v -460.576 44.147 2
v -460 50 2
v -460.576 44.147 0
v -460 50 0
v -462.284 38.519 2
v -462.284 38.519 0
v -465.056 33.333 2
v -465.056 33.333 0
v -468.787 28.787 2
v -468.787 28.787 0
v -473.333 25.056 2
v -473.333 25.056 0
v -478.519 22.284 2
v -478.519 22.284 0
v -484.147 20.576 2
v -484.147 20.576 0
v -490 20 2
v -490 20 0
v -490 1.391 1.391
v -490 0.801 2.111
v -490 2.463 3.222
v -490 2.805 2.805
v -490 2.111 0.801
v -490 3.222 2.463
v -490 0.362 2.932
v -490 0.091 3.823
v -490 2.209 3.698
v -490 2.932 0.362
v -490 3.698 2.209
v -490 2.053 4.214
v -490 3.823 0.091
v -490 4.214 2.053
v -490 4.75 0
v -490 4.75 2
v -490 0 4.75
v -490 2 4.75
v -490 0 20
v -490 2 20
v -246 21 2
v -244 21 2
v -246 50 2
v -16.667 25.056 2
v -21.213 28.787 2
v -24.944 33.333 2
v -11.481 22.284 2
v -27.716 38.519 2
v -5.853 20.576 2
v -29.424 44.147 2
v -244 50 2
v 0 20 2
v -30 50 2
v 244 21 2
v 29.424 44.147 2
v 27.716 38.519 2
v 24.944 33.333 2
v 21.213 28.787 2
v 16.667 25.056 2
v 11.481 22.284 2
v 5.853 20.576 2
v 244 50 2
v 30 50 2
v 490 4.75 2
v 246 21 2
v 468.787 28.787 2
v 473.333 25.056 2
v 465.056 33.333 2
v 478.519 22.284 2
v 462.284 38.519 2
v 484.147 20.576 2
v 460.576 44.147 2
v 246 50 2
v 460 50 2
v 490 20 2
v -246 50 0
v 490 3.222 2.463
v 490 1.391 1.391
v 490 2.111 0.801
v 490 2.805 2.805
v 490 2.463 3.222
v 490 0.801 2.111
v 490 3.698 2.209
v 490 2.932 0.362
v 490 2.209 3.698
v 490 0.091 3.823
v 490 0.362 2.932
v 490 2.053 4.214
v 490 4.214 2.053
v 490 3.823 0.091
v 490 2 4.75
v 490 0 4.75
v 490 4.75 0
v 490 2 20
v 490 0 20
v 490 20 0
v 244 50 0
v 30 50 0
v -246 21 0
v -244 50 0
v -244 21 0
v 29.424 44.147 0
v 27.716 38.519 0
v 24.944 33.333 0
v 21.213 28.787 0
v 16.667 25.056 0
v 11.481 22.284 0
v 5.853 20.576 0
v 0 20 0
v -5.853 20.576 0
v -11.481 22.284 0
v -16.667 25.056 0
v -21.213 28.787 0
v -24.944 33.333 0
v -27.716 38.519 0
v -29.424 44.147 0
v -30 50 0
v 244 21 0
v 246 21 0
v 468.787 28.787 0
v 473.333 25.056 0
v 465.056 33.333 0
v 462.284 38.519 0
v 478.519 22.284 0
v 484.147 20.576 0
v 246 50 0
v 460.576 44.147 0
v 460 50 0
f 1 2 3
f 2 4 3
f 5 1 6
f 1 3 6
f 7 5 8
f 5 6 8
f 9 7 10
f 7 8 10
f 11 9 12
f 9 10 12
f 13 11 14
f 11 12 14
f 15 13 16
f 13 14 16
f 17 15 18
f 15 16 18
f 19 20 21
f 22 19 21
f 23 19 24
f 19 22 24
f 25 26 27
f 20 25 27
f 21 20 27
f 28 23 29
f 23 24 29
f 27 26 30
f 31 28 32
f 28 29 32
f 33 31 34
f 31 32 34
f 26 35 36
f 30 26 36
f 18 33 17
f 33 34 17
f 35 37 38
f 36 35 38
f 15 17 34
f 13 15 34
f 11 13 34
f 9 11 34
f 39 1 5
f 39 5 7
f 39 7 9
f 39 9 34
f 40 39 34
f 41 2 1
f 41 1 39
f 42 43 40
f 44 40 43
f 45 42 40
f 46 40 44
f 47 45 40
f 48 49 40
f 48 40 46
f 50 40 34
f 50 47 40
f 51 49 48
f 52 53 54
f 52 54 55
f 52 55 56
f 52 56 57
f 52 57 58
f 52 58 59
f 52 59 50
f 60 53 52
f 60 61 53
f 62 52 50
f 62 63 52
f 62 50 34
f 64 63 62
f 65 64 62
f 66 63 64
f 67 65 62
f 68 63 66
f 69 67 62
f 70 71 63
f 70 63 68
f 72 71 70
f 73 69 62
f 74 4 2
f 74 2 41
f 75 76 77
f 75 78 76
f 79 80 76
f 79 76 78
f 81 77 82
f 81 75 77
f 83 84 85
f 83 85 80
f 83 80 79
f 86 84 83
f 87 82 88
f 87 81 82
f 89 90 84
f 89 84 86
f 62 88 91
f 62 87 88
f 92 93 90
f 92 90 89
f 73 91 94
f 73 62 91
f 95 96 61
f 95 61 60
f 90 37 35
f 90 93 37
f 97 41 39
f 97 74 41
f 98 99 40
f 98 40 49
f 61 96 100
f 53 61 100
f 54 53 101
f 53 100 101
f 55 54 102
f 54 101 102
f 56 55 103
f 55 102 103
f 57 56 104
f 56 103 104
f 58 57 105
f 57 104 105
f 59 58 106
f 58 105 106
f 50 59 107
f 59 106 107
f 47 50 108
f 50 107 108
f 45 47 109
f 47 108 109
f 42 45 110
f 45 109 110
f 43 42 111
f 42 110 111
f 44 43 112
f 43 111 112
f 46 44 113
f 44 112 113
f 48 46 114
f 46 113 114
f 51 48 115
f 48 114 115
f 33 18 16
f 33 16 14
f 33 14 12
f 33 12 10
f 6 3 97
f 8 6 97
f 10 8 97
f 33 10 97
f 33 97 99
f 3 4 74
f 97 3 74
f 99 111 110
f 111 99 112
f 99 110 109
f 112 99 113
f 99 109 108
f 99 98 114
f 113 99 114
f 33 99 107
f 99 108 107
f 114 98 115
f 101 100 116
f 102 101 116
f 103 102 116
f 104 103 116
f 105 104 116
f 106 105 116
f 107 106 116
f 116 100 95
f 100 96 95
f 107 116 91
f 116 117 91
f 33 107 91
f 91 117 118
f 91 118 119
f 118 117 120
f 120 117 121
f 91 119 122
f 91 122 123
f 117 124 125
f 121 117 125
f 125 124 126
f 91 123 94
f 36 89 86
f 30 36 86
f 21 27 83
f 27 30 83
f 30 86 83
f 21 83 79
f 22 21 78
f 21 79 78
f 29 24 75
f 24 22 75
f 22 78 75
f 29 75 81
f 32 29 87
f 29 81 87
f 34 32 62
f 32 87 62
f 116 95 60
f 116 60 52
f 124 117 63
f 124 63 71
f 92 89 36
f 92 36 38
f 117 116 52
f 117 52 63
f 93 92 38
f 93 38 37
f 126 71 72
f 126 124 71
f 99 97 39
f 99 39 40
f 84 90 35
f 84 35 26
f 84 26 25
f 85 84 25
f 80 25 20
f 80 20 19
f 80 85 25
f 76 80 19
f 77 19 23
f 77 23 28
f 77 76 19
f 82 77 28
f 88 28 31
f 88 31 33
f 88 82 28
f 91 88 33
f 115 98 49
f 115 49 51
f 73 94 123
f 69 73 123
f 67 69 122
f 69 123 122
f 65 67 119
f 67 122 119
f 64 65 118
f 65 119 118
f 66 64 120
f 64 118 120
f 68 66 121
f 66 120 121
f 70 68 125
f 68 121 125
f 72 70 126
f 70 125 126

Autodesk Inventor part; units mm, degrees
ref_plane "YZ Plane" through (0, 0, 0) normal (1, 0, 0) x (0, 1, 0)
ref_plane "XZ Plane" through (0, 0, 0) normal (0, 1, 0) x (-1, 0, 0)
ref_plane "XY Plane" through (0, 0, 0) normal (0, 0, 1) x (1, 0, 0)
sketch "Sketch1" plane through (0, 0, 0) normal (0, 0, 1) x (1, 0, 0)
  line L0 (-490, 50) -> (490, 50)
  line L1 (490, 50) -> (490, 0)
  line L2 (490, 0) -> (-490, 0)
  line L3 (-490, 0) -> (-490, 50)
  point P0 (0, 0)
  point P1 (0, 0)
  dimension "d0" = 980
  dimension "d1" = 50
extrude "Plate1" add sketch "Sketch1" along normal blind 2
sketch "Sketch2" plane through (490, 2, 0) normal (0, -1, 0) x (1, 0, 0)
  line L0 (-980, 0) -> (0, 0)
  line L1 (0, 0) -> (0, 20)
  line L2 (0, 20) -> (-980, 20)
  line L3 (-980, 20) -> (-980, 0)
edge flange "Flange1" height 20 angle 90 thickness 2 bend radius 2.75 thickness toward (0, -1, 0) relief tear relief width 2 relief depth 1 edges at (0, 0, 2) wall of the first edge with corners at (-490, 2, 0) (490, 2, 0) (490, 2, 20) (-490, 2, 20)
bend "Bend1"
corner "Corner1"
sketch "Sketch5" plane through (0, 0, 0) normal (0, 0, -1) x (-1, 0, 0)
  line L0 (490, 50) -> (-490, 50) projected
  line L1 (490, 0) -> (-490, 0) projected
  circle A0 centre (0, 50) radius 30
  line L2 (-490, 0) -> (-490, 50)
  line L3 (490, 0) -> (490, 50)
  circle A1 centre (-490, 50) radius 30
  circle A2 centre (490, 50) radius 30
  line L4 (-246, 50) -> (-244, 50)
  line L5 (-244, 50) -> (-244, 21)
  line L6 (-244, 21) -> (-246, 21)
  line L7 (-246, 21) -> (-246, 50)
  line L8 (244, 50) -> (246, 50)
  line L9 (246, 50) -> (246, 21)
  line L10 (246, 21) -> (244, 21)
  line L11 (244, 21) -> (244, 50)
  line L12 (0, 50) -> (0, 0) construction
  point P0 (245, 21)
  point P1 (-245, 21)
  point P2 (-490, 20)
  point P3 (-460, 50)
  point P4 (-30, 50)
  point P5 (30, 50)
  point P6 (460, 50)
  point P7 (490, 20)
  point P8 (-244, 50)
  point P9 (246, 50)
  dimension "d33" = 60
  dimension "d34" = 2
  dimension "d35" = 29
  dimension "d36" = 490
extrude "Extrusion1" cut sketch "Sketch5" against normal through all contours L9 L10 L11 L0 | L0 L3 A2 | A0 L0 | L5 L6 L7 L0 | L2 L0 A1 picked at (470.2507, 47.7748) picked at (6.5355, 34.7298) picked at (-470.2507, 47.7748)
sketch "Sketch7" plane through (0, 0, 2) normal (0, 0, 1) x (1, 0, 0)
  line L0 (468.7934, 20.88) -> (468.7934, 8.88) construction
  line L1 (468.7934, 8.88) -> (251.3453, 8.88) construction
  line L2 (251.3453, 8.88) -> (251.3453, 20.88) construction
  line L3 (251.3453, 20.88) -> (468.7934, 20.88) construction
  line L4 (-244, 50) -> (-30, 50) projected
  point P0 (0, 0)
  point P1 (-1, 50)
  point P2 (1, 50)
  dimension "d30" = 12
mark "Mark1"
equation "\"d1\" = Стрингер_7"
equation "\"d2\" = Thickness"
equation "\"d3\" = BendReliefWidth"
equation "\"d4\" = BendReliefDepth"
equation "\"d5\" = MinimumRemnant"
equation "\"d6\" = TransitionRadius"
equation "\"d9\" = BendRadius"
equation "\"d10\" = CornerReliefSize"
equation "\"d11\" = GapSize"
equation "\"d12\" = JacobiRadiusSize"
equation "\"GapSize\" = Thickness"
equation "\"MinimumRemnant\" = 2 * Thickness"
equation "\"BendReliefDepth\" = 0.5 * Thickness"
equation "\"BendReliefWidth\" = Thickness"
equation "\"CornerReliefSize\" = 4 * Thickness"
equation "\"JacobiRadiusSize\" = BendRadius"
equation "\"TransitionRadius\" = BendRadius"
equation "\"Стрингер_7\" = 50"
equation "\"Thickness\" = 2"
equation "\"BendRadius\" = 2.75"
properties part number "MSC 504 STRINGER BOARD BELLY" material "Stainless Steel"
